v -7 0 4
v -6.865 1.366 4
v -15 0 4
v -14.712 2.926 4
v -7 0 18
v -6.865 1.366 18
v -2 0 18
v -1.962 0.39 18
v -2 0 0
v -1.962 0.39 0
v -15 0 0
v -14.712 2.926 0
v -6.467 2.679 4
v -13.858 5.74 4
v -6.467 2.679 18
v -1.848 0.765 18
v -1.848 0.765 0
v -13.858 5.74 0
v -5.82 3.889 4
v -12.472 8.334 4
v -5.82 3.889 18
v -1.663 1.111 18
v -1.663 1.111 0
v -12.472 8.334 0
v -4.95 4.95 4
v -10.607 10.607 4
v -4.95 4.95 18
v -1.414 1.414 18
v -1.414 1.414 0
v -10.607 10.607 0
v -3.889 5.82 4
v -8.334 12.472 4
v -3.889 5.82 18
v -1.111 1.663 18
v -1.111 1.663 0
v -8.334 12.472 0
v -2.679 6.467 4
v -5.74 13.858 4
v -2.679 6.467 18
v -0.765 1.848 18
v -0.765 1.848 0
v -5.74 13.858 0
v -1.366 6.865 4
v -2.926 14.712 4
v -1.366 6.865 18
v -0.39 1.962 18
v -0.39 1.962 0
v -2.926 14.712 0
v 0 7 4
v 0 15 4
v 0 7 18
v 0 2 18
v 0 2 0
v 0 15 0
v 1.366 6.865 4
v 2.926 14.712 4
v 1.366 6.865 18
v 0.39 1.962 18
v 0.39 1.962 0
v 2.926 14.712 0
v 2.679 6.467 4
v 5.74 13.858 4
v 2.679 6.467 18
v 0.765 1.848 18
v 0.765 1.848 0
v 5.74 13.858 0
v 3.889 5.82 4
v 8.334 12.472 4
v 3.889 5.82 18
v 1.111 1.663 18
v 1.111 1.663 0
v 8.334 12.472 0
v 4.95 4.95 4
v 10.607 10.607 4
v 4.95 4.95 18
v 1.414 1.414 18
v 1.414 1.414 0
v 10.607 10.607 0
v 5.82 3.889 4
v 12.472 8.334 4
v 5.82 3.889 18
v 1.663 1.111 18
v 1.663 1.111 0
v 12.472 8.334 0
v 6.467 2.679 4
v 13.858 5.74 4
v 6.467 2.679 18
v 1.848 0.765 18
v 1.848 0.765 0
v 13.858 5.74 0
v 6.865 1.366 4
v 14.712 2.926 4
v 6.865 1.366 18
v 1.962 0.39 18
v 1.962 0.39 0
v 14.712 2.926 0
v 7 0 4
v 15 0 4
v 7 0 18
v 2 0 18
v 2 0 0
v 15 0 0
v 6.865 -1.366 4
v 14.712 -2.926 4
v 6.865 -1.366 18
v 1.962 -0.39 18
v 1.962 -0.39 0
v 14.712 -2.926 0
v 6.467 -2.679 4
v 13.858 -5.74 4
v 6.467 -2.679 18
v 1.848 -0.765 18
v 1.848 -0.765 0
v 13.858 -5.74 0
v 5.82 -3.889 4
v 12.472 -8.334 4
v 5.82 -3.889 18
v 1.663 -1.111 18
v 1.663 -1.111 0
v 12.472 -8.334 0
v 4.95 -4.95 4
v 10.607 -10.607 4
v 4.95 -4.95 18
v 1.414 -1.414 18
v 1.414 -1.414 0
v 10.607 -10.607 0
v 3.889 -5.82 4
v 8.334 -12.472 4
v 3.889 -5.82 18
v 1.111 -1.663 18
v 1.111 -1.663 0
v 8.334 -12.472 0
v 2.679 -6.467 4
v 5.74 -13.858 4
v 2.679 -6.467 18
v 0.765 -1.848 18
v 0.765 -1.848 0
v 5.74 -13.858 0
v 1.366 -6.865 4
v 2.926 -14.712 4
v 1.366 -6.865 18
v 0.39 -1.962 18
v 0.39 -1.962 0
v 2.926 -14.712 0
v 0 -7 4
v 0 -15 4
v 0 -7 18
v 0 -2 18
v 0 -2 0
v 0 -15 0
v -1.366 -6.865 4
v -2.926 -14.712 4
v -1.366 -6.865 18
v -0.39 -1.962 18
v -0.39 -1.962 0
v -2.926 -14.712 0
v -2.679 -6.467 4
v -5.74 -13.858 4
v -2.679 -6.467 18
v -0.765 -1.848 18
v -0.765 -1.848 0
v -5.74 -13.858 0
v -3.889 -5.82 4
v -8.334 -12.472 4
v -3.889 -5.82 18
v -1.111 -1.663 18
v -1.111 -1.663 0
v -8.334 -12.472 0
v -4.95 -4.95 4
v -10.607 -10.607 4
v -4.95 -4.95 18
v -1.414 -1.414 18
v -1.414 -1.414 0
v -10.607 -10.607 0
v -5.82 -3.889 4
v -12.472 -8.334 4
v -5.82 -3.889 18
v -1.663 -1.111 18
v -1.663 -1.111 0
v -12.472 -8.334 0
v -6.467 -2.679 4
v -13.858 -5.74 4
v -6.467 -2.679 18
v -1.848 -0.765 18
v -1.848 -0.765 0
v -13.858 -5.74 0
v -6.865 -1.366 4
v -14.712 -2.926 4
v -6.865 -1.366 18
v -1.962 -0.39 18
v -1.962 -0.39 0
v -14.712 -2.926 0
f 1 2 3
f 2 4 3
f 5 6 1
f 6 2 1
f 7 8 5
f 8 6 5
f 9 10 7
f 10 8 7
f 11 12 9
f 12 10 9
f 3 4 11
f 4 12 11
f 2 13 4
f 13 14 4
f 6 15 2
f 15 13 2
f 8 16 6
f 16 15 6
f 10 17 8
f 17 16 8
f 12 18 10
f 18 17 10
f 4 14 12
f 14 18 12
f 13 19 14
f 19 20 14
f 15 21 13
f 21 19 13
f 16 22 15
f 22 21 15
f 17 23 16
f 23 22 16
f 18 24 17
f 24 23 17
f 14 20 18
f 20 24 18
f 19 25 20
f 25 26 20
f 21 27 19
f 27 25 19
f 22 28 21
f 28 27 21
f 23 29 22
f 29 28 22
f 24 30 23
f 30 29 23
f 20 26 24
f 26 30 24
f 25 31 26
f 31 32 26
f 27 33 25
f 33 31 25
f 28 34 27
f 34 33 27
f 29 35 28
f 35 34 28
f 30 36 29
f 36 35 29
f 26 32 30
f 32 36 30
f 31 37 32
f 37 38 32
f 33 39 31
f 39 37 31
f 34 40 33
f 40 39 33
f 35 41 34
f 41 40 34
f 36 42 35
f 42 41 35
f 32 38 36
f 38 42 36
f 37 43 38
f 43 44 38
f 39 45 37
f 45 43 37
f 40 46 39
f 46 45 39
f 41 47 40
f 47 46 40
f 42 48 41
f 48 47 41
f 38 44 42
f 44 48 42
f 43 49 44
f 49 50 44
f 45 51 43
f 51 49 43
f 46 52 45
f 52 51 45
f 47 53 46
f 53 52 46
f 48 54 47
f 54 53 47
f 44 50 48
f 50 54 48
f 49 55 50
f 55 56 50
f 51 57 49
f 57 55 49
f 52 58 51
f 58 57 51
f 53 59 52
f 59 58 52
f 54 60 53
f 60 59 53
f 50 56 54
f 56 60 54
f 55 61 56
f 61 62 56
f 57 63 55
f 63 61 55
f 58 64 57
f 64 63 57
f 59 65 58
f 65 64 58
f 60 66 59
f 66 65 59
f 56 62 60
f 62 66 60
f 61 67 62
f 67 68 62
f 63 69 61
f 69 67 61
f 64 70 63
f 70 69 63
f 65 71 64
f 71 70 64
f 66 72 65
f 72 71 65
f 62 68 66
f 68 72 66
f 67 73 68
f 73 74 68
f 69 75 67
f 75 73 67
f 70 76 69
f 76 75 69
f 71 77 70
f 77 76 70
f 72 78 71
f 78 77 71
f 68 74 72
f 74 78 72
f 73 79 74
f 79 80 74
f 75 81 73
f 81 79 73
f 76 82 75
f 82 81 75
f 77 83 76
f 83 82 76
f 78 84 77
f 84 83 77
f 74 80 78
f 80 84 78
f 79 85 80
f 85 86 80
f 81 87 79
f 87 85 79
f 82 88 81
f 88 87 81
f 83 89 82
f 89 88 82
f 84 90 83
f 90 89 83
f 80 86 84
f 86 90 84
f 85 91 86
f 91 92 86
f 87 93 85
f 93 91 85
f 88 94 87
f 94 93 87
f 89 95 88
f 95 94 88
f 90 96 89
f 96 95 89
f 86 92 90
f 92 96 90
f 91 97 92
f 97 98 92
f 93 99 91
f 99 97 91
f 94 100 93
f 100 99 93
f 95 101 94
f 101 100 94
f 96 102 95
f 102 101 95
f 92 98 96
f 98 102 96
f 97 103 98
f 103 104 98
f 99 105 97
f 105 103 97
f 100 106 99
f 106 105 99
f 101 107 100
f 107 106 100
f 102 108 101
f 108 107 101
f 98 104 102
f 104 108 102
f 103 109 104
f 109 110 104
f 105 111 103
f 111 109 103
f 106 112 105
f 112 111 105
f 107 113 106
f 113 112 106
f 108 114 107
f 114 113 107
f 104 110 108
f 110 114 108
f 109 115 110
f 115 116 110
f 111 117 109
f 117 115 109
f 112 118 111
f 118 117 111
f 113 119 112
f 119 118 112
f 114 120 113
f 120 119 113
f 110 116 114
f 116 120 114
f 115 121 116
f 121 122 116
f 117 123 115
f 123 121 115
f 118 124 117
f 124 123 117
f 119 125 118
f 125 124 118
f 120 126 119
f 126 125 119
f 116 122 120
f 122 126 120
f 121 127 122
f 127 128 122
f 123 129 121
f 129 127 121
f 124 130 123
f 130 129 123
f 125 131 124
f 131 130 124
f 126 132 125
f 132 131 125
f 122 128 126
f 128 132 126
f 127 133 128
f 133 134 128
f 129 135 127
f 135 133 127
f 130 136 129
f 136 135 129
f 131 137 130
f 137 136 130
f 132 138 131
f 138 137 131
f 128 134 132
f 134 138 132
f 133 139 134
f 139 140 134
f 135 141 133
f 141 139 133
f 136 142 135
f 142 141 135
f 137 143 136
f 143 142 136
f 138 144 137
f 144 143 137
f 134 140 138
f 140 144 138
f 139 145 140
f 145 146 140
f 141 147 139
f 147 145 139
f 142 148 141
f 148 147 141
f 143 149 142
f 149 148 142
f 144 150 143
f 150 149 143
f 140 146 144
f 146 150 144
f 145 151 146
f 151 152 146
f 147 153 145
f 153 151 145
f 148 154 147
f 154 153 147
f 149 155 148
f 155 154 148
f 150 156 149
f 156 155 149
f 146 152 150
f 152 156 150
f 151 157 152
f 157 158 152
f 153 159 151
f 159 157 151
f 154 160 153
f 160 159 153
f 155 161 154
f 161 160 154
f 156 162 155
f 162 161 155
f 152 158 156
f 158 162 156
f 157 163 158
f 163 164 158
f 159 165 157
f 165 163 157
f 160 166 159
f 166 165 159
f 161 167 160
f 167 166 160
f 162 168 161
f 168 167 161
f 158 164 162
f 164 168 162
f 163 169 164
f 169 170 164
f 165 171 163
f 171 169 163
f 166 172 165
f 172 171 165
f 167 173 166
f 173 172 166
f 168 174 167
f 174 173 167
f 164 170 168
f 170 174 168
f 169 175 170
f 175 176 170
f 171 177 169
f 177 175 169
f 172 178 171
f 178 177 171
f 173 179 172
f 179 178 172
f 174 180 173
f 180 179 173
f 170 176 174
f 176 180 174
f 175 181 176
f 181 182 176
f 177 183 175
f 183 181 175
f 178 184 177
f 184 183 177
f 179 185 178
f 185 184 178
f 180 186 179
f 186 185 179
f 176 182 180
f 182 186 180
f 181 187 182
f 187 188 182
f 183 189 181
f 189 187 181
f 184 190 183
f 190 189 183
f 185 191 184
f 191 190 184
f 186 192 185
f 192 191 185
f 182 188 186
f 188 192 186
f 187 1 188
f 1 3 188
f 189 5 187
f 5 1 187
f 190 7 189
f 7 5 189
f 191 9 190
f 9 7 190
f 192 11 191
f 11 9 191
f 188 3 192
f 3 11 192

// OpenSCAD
$fn = 32;

// ----------------------------------------------------------------------
// Profiled standoff: flanged spacer, 18 mm long, bore 4 mm
// ----------------------------------------------------------------------

// --- parameters (mm) ---
revolve_angle = 360;      // full turn around the Z axis
profile_points = 6;       // points of the closed outline

profile = [[2, 0], [15, 0], [15, 4], [7, 4], [7, 18], [2, 18]];  // single closed polygon, 6 points, counter clockwise

// --- the one profile operation ---
rotate_extrude(angle = revolve_angle) polygon(points = profile);
